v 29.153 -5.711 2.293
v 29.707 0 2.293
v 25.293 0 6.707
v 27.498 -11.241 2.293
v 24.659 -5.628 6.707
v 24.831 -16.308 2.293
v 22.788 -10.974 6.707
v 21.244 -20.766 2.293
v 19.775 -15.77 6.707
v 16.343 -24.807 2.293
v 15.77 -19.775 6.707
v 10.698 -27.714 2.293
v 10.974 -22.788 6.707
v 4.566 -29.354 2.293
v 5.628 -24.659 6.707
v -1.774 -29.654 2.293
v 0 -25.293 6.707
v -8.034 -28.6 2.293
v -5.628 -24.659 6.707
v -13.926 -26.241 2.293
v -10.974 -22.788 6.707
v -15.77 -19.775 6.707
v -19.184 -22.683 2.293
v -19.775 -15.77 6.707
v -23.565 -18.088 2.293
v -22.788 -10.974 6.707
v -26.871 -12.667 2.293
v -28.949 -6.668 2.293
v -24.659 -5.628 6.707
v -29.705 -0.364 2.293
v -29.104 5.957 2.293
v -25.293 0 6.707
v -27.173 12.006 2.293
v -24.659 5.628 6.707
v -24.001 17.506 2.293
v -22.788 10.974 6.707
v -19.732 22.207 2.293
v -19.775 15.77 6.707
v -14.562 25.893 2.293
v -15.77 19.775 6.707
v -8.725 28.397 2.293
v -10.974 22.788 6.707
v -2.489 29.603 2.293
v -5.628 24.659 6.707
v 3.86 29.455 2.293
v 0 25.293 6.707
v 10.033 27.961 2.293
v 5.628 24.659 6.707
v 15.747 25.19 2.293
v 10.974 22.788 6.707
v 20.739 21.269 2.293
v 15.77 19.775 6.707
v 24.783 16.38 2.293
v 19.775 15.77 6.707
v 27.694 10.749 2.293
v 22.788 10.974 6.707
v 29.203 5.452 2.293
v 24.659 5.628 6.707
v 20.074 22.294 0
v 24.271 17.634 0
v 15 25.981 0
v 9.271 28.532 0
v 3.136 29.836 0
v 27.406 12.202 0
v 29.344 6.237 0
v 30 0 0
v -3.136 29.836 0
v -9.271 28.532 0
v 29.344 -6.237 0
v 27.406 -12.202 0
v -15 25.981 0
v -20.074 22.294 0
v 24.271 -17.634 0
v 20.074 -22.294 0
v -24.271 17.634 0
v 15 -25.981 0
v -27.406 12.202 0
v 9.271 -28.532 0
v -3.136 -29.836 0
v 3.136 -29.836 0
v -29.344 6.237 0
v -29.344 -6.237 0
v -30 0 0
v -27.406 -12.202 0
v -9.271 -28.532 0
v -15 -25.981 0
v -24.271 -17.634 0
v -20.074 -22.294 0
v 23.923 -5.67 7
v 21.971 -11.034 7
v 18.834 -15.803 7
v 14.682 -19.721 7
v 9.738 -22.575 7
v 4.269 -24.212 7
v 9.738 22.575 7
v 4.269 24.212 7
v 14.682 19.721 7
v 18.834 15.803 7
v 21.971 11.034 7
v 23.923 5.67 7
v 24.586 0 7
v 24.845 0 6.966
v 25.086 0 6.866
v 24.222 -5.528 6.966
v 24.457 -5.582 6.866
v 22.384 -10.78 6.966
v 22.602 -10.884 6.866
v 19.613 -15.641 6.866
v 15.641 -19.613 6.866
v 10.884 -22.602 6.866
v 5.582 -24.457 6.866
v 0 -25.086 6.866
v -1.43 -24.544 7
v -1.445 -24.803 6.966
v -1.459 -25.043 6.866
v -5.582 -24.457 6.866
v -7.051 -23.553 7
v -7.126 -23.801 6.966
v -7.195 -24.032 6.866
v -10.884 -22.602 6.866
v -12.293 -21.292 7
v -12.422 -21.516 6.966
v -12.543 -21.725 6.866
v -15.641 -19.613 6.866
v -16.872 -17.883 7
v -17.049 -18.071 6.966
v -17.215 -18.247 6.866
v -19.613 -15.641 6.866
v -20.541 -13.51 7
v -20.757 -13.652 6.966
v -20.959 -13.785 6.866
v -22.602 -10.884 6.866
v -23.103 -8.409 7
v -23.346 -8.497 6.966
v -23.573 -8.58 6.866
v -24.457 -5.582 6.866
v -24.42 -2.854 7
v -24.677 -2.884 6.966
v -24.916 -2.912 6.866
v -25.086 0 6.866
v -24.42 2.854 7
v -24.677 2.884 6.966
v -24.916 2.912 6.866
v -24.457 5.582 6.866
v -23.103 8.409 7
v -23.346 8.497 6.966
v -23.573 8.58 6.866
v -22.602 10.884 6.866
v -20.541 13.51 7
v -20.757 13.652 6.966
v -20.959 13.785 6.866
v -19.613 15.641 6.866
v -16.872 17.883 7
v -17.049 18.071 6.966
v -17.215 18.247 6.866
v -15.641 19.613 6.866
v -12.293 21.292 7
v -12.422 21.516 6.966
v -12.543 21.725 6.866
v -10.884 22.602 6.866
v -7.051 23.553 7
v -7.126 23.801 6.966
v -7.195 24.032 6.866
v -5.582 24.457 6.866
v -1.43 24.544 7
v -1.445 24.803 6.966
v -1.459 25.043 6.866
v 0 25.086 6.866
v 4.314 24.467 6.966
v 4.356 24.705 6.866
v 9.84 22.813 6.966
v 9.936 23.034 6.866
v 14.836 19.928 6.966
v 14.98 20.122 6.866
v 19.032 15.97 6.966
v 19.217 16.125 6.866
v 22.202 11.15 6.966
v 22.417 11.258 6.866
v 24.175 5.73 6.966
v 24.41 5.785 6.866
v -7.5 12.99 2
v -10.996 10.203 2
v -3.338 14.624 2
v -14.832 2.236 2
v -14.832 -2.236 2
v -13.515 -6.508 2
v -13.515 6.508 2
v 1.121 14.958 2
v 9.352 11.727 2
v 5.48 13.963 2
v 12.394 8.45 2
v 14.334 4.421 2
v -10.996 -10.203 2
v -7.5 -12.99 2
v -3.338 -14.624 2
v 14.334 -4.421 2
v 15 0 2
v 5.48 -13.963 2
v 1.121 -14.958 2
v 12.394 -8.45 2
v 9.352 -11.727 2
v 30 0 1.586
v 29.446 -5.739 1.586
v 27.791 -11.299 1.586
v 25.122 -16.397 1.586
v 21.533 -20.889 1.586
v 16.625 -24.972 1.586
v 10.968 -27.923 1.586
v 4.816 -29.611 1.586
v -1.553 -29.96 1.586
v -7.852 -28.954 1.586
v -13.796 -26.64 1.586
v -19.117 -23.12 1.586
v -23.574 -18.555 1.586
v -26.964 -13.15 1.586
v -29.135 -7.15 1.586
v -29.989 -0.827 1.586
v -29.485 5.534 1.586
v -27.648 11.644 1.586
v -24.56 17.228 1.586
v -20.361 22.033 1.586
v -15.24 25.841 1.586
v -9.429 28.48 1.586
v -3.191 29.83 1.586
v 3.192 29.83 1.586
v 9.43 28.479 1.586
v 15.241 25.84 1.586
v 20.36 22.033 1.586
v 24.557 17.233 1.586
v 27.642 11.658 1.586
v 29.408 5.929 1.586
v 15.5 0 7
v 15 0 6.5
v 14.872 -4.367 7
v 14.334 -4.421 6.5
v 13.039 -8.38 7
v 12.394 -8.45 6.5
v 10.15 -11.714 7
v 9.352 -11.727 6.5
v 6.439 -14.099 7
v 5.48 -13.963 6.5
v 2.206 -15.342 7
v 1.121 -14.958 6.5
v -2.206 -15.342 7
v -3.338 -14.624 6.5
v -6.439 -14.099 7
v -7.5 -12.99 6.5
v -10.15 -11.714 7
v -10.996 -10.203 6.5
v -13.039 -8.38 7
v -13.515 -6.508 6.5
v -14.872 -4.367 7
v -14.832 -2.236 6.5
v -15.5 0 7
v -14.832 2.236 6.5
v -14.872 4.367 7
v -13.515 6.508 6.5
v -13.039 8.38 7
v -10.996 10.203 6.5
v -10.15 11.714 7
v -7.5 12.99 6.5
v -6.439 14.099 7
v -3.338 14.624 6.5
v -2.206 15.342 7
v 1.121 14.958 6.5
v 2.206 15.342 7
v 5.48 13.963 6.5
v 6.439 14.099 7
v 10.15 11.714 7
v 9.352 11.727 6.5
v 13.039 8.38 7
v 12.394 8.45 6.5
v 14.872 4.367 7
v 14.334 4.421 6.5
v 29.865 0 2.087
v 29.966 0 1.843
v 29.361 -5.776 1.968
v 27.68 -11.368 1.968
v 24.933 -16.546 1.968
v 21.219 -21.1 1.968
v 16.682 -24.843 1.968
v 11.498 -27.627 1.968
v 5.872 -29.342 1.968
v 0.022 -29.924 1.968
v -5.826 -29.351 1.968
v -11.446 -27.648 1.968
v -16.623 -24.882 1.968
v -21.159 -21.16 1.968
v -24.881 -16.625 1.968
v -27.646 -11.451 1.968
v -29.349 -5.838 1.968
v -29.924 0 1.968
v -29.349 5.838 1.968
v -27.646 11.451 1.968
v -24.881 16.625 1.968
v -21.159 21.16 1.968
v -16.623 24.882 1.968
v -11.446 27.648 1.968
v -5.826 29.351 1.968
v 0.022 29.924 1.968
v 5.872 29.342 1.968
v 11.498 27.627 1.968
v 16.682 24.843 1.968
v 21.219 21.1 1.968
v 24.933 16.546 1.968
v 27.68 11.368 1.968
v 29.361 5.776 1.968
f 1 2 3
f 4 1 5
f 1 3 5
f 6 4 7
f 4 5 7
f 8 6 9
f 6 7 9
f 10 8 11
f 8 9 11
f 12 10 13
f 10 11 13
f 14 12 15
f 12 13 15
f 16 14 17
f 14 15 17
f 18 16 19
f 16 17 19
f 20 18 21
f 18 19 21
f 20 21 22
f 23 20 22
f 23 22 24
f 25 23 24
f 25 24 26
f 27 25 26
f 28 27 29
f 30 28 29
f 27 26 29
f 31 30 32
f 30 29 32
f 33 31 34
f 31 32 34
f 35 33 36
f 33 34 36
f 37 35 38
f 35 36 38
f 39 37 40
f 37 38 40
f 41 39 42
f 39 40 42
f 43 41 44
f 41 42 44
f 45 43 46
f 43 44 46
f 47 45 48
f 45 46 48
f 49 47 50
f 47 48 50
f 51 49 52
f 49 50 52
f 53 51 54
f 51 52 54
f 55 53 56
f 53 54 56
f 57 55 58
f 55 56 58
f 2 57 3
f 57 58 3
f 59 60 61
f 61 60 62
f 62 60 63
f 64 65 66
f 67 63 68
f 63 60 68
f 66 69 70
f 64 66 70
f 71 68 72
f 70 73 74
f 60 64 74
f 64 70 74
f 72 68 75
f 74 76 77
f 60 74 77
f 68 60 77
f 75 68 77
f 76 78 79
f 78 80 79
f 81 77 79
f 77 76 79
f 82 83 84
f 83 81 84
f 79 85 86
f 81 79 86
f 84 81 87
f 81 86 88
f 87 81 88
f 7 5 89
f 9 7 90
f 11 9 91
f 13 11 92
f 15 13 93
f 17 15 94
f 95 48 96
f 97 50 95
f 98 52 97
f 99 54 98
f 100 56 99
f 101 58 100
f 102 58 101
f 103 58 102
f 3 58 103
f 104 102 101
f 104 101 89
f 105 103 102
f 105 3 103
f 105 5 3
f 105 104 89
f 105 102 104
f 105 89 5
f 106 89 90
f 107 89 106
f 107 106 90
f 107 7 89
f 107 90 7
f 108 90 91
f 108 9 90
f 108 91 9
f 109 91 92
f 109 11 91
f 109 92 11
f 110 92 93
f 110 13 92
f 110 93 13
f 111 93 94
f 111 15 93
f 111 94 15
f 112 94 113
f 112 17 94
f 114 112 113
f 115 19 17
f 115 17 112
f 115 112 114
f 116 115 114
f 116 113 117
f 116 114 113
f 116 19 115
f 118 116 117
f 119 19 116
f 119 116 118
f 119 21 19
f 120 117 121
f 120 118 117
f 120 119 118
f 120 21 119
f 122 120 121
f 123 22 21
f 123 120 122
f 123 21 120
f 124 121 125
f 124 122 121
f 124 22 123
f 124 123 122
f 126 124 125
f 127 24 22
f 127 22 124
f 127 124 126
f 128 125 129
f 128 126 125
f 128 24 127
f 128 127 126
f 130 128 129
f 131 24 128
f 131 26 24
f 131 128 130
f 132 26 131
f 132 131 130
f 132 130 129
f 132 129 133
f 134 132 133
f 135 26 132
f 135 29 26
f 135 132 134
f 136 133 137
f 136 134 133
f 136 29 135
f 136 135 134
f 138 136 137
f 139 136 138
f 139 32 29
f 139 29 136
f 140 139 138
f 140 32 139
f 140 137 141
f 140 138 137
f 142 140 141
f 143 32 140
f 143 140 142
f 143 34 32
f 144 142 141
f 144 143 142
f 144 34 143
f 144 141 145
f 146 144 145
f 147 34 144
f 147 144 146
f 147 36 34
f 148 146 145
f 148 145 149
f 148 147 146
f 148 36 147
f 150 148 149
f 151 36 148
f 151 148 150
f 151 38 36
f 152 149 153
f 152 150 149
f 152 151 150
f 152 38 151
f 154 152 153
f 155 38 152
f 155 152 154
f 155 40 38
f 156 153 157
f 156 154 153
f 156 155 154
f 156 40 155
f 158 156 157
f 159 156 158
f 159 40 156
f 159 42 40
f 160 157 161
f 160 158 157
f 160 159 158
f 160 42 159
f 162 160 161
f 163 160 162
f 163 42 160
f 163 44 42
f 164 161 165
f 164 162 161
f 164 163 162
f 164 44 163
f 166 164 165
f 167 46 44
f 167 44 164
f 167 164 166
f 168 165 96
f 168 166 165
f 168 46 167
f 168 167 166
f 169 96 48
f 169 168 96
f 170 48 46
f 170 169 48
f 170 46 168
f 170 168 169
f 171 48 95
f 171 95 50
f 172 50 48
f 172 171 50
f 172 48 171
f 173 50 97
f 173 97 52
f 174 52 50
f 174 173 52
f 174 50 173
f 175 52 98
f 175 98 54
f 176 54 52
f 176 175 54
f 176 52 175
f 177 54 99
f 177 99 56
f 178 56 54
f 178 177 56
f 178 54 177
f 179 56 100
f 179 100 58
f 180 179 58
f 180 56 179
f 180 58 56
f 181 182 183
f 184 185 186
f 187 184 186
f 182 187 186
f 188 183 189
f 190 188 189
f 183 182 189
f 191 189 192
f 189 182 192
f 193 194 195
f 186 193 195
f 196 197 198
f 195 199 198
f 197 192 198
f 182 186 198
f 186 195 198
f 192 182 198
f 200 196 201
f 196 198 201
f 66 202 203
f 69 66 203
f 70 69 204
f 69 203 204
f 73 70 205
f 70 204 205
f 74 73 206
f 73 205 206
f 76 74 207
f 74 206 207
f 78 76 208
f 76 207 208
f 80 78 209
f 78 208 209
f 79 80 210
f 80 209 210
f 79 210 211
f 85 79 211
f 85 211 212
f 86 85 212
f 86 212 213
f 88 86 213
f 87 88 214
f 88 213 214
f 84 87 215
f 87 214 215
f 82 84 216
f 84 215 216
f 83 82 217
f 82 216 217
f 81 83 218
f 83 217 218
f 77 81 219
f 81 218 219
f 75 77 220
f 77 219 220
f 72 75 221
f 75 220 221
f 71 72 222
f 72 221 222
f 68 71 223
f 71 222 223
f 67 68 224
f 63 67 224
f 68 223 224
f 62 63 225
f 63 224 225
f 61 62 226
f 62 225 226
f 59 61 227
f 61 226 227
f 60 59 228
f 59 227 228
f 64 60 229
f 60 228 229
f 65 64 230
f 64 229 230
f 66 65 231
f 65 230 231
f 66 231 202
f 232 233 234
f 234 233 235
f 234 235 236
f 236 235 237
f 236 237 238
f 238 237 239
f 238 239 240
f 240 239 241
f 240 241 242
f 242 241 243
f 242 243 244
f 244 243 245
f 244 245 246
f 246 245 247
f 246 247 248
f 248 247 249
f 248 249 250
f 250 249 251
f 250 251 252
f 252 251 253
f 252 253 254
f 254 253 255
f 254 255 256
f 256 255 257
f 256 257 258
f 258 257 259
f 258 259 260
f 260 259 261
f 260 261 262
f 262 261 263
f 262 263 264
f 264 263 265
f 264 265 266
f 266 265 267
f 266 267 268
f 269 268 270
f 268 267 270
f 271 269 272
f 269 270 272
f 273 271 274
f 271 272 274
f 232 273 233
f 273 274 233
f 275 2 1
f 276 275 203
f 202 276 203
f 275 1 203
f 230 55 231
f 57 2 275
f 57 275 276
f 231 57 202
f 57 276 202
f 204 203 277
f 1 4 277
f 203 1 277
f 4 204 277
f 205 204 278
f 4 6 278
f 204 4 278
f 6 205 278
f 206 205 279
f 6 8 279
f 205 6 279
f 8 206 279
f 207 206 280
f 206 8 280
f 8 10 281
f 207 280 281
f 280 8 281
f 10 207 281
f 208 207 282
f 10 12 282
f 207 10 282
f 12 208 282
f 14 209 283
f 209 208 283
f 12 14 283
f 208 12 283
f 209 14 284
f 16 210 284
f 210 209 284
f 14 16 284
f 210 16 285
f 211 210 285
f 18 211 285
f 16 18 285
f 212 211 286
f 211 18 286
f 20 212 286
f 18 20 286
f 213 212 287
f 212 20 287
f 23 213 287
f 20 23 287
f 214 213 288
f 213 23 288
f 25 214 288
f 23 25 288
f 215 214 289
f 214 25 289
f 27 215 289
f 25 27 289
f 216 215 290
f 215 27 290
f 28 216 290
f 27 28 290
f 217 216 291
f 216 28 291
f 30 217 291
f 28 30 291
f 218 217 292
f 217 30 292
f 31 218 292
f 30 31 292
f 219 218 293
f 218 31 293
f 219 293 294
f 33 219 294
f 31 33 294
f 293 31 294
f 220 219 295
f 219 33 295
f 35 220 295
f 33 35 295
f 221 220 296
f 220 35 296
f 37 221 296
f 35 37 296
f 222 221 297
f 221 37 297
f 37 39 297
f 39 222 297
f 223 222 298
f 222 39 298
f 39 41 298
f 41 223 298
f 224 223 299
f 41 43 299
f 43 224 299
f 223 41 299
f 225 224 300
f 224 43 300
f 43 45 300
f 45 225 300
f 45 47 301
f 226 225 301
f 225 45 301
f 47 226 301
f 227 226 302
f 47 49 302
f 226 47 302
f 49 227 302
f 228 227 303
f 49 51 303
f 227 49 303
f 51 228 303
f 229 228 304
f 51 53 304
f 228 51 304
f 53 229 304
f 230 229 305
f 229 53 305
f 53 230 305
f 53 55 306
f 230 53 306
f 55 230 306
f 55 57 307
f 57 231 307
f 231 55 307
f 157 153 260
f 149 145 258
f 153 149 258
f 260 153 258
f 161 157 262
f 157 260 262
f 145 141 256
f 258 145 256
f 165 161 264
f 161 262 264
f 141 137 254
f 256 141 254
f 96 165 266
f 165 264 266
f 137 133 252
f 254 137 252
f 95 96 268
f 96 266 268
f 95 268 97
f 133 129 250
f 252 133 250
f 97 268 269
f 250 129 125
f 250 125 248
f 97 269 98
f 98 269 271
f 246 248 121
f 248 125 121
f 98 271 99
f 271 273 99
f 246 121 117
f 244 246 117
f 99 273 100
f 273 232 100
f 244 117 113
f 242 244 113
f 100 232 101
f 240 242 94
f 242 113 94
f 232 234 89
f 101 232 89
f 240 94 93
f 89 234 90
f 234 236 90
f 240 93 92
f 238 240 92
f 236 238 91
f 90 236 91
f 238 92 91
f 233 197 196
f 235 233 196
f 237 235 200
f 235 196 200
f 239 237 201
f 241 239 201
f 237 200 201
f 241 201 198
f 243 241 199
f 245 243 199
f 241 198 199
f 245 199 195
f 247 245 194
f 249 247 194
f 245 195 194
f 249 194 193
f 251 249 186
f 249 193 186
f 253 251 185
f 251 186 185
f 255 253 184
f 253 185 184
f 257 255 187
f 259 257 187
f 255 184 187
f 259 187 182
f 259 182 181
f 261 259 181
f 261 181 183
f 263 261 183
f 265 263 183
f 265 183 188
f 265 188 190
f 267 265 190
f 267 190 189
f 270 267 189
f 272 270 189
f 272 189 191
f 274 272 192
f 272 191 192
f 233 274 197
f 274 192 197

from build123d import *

# Parameters (mm, degrees)
F2_SIZE = 5
F3_SIZE = 0.5
F4_R    = 1


with BuildPart() as f1:
    # F0 (on Front) → F1 (revolve)
    with BuildSketch(Plane.XZ):
        Polygon((15, 2), (0, 2), (0, 0), (30, 0), (30, 7), (15, 7), align=None)
    revolve(axis=Axis((0, 0, 16.768291272), (0, 0, -1)))

    # F2
    f2_edges = [f1.edges().sort_by_distance(p)[0] for p in [
        (-30, 0, 7),
    ]]
    chamfer(f2_edges, length=F2_SIZE)

    # F3
    f3_edges = [f1.edges().sort_by_distance(p)[0] for p in [
        (-15, 0, 7),
    ]]
    chamfer(f3_edges, length=F3_SIZE)

    # F4
    f4_edges = [f1.edges().sort_by_distance(p)[0] for p in [
        (-25, 0, 7),
        (-30, 0, 2),
    ]]
    fillet(f4_edges, radius=F4_R)


solid = f1.part
